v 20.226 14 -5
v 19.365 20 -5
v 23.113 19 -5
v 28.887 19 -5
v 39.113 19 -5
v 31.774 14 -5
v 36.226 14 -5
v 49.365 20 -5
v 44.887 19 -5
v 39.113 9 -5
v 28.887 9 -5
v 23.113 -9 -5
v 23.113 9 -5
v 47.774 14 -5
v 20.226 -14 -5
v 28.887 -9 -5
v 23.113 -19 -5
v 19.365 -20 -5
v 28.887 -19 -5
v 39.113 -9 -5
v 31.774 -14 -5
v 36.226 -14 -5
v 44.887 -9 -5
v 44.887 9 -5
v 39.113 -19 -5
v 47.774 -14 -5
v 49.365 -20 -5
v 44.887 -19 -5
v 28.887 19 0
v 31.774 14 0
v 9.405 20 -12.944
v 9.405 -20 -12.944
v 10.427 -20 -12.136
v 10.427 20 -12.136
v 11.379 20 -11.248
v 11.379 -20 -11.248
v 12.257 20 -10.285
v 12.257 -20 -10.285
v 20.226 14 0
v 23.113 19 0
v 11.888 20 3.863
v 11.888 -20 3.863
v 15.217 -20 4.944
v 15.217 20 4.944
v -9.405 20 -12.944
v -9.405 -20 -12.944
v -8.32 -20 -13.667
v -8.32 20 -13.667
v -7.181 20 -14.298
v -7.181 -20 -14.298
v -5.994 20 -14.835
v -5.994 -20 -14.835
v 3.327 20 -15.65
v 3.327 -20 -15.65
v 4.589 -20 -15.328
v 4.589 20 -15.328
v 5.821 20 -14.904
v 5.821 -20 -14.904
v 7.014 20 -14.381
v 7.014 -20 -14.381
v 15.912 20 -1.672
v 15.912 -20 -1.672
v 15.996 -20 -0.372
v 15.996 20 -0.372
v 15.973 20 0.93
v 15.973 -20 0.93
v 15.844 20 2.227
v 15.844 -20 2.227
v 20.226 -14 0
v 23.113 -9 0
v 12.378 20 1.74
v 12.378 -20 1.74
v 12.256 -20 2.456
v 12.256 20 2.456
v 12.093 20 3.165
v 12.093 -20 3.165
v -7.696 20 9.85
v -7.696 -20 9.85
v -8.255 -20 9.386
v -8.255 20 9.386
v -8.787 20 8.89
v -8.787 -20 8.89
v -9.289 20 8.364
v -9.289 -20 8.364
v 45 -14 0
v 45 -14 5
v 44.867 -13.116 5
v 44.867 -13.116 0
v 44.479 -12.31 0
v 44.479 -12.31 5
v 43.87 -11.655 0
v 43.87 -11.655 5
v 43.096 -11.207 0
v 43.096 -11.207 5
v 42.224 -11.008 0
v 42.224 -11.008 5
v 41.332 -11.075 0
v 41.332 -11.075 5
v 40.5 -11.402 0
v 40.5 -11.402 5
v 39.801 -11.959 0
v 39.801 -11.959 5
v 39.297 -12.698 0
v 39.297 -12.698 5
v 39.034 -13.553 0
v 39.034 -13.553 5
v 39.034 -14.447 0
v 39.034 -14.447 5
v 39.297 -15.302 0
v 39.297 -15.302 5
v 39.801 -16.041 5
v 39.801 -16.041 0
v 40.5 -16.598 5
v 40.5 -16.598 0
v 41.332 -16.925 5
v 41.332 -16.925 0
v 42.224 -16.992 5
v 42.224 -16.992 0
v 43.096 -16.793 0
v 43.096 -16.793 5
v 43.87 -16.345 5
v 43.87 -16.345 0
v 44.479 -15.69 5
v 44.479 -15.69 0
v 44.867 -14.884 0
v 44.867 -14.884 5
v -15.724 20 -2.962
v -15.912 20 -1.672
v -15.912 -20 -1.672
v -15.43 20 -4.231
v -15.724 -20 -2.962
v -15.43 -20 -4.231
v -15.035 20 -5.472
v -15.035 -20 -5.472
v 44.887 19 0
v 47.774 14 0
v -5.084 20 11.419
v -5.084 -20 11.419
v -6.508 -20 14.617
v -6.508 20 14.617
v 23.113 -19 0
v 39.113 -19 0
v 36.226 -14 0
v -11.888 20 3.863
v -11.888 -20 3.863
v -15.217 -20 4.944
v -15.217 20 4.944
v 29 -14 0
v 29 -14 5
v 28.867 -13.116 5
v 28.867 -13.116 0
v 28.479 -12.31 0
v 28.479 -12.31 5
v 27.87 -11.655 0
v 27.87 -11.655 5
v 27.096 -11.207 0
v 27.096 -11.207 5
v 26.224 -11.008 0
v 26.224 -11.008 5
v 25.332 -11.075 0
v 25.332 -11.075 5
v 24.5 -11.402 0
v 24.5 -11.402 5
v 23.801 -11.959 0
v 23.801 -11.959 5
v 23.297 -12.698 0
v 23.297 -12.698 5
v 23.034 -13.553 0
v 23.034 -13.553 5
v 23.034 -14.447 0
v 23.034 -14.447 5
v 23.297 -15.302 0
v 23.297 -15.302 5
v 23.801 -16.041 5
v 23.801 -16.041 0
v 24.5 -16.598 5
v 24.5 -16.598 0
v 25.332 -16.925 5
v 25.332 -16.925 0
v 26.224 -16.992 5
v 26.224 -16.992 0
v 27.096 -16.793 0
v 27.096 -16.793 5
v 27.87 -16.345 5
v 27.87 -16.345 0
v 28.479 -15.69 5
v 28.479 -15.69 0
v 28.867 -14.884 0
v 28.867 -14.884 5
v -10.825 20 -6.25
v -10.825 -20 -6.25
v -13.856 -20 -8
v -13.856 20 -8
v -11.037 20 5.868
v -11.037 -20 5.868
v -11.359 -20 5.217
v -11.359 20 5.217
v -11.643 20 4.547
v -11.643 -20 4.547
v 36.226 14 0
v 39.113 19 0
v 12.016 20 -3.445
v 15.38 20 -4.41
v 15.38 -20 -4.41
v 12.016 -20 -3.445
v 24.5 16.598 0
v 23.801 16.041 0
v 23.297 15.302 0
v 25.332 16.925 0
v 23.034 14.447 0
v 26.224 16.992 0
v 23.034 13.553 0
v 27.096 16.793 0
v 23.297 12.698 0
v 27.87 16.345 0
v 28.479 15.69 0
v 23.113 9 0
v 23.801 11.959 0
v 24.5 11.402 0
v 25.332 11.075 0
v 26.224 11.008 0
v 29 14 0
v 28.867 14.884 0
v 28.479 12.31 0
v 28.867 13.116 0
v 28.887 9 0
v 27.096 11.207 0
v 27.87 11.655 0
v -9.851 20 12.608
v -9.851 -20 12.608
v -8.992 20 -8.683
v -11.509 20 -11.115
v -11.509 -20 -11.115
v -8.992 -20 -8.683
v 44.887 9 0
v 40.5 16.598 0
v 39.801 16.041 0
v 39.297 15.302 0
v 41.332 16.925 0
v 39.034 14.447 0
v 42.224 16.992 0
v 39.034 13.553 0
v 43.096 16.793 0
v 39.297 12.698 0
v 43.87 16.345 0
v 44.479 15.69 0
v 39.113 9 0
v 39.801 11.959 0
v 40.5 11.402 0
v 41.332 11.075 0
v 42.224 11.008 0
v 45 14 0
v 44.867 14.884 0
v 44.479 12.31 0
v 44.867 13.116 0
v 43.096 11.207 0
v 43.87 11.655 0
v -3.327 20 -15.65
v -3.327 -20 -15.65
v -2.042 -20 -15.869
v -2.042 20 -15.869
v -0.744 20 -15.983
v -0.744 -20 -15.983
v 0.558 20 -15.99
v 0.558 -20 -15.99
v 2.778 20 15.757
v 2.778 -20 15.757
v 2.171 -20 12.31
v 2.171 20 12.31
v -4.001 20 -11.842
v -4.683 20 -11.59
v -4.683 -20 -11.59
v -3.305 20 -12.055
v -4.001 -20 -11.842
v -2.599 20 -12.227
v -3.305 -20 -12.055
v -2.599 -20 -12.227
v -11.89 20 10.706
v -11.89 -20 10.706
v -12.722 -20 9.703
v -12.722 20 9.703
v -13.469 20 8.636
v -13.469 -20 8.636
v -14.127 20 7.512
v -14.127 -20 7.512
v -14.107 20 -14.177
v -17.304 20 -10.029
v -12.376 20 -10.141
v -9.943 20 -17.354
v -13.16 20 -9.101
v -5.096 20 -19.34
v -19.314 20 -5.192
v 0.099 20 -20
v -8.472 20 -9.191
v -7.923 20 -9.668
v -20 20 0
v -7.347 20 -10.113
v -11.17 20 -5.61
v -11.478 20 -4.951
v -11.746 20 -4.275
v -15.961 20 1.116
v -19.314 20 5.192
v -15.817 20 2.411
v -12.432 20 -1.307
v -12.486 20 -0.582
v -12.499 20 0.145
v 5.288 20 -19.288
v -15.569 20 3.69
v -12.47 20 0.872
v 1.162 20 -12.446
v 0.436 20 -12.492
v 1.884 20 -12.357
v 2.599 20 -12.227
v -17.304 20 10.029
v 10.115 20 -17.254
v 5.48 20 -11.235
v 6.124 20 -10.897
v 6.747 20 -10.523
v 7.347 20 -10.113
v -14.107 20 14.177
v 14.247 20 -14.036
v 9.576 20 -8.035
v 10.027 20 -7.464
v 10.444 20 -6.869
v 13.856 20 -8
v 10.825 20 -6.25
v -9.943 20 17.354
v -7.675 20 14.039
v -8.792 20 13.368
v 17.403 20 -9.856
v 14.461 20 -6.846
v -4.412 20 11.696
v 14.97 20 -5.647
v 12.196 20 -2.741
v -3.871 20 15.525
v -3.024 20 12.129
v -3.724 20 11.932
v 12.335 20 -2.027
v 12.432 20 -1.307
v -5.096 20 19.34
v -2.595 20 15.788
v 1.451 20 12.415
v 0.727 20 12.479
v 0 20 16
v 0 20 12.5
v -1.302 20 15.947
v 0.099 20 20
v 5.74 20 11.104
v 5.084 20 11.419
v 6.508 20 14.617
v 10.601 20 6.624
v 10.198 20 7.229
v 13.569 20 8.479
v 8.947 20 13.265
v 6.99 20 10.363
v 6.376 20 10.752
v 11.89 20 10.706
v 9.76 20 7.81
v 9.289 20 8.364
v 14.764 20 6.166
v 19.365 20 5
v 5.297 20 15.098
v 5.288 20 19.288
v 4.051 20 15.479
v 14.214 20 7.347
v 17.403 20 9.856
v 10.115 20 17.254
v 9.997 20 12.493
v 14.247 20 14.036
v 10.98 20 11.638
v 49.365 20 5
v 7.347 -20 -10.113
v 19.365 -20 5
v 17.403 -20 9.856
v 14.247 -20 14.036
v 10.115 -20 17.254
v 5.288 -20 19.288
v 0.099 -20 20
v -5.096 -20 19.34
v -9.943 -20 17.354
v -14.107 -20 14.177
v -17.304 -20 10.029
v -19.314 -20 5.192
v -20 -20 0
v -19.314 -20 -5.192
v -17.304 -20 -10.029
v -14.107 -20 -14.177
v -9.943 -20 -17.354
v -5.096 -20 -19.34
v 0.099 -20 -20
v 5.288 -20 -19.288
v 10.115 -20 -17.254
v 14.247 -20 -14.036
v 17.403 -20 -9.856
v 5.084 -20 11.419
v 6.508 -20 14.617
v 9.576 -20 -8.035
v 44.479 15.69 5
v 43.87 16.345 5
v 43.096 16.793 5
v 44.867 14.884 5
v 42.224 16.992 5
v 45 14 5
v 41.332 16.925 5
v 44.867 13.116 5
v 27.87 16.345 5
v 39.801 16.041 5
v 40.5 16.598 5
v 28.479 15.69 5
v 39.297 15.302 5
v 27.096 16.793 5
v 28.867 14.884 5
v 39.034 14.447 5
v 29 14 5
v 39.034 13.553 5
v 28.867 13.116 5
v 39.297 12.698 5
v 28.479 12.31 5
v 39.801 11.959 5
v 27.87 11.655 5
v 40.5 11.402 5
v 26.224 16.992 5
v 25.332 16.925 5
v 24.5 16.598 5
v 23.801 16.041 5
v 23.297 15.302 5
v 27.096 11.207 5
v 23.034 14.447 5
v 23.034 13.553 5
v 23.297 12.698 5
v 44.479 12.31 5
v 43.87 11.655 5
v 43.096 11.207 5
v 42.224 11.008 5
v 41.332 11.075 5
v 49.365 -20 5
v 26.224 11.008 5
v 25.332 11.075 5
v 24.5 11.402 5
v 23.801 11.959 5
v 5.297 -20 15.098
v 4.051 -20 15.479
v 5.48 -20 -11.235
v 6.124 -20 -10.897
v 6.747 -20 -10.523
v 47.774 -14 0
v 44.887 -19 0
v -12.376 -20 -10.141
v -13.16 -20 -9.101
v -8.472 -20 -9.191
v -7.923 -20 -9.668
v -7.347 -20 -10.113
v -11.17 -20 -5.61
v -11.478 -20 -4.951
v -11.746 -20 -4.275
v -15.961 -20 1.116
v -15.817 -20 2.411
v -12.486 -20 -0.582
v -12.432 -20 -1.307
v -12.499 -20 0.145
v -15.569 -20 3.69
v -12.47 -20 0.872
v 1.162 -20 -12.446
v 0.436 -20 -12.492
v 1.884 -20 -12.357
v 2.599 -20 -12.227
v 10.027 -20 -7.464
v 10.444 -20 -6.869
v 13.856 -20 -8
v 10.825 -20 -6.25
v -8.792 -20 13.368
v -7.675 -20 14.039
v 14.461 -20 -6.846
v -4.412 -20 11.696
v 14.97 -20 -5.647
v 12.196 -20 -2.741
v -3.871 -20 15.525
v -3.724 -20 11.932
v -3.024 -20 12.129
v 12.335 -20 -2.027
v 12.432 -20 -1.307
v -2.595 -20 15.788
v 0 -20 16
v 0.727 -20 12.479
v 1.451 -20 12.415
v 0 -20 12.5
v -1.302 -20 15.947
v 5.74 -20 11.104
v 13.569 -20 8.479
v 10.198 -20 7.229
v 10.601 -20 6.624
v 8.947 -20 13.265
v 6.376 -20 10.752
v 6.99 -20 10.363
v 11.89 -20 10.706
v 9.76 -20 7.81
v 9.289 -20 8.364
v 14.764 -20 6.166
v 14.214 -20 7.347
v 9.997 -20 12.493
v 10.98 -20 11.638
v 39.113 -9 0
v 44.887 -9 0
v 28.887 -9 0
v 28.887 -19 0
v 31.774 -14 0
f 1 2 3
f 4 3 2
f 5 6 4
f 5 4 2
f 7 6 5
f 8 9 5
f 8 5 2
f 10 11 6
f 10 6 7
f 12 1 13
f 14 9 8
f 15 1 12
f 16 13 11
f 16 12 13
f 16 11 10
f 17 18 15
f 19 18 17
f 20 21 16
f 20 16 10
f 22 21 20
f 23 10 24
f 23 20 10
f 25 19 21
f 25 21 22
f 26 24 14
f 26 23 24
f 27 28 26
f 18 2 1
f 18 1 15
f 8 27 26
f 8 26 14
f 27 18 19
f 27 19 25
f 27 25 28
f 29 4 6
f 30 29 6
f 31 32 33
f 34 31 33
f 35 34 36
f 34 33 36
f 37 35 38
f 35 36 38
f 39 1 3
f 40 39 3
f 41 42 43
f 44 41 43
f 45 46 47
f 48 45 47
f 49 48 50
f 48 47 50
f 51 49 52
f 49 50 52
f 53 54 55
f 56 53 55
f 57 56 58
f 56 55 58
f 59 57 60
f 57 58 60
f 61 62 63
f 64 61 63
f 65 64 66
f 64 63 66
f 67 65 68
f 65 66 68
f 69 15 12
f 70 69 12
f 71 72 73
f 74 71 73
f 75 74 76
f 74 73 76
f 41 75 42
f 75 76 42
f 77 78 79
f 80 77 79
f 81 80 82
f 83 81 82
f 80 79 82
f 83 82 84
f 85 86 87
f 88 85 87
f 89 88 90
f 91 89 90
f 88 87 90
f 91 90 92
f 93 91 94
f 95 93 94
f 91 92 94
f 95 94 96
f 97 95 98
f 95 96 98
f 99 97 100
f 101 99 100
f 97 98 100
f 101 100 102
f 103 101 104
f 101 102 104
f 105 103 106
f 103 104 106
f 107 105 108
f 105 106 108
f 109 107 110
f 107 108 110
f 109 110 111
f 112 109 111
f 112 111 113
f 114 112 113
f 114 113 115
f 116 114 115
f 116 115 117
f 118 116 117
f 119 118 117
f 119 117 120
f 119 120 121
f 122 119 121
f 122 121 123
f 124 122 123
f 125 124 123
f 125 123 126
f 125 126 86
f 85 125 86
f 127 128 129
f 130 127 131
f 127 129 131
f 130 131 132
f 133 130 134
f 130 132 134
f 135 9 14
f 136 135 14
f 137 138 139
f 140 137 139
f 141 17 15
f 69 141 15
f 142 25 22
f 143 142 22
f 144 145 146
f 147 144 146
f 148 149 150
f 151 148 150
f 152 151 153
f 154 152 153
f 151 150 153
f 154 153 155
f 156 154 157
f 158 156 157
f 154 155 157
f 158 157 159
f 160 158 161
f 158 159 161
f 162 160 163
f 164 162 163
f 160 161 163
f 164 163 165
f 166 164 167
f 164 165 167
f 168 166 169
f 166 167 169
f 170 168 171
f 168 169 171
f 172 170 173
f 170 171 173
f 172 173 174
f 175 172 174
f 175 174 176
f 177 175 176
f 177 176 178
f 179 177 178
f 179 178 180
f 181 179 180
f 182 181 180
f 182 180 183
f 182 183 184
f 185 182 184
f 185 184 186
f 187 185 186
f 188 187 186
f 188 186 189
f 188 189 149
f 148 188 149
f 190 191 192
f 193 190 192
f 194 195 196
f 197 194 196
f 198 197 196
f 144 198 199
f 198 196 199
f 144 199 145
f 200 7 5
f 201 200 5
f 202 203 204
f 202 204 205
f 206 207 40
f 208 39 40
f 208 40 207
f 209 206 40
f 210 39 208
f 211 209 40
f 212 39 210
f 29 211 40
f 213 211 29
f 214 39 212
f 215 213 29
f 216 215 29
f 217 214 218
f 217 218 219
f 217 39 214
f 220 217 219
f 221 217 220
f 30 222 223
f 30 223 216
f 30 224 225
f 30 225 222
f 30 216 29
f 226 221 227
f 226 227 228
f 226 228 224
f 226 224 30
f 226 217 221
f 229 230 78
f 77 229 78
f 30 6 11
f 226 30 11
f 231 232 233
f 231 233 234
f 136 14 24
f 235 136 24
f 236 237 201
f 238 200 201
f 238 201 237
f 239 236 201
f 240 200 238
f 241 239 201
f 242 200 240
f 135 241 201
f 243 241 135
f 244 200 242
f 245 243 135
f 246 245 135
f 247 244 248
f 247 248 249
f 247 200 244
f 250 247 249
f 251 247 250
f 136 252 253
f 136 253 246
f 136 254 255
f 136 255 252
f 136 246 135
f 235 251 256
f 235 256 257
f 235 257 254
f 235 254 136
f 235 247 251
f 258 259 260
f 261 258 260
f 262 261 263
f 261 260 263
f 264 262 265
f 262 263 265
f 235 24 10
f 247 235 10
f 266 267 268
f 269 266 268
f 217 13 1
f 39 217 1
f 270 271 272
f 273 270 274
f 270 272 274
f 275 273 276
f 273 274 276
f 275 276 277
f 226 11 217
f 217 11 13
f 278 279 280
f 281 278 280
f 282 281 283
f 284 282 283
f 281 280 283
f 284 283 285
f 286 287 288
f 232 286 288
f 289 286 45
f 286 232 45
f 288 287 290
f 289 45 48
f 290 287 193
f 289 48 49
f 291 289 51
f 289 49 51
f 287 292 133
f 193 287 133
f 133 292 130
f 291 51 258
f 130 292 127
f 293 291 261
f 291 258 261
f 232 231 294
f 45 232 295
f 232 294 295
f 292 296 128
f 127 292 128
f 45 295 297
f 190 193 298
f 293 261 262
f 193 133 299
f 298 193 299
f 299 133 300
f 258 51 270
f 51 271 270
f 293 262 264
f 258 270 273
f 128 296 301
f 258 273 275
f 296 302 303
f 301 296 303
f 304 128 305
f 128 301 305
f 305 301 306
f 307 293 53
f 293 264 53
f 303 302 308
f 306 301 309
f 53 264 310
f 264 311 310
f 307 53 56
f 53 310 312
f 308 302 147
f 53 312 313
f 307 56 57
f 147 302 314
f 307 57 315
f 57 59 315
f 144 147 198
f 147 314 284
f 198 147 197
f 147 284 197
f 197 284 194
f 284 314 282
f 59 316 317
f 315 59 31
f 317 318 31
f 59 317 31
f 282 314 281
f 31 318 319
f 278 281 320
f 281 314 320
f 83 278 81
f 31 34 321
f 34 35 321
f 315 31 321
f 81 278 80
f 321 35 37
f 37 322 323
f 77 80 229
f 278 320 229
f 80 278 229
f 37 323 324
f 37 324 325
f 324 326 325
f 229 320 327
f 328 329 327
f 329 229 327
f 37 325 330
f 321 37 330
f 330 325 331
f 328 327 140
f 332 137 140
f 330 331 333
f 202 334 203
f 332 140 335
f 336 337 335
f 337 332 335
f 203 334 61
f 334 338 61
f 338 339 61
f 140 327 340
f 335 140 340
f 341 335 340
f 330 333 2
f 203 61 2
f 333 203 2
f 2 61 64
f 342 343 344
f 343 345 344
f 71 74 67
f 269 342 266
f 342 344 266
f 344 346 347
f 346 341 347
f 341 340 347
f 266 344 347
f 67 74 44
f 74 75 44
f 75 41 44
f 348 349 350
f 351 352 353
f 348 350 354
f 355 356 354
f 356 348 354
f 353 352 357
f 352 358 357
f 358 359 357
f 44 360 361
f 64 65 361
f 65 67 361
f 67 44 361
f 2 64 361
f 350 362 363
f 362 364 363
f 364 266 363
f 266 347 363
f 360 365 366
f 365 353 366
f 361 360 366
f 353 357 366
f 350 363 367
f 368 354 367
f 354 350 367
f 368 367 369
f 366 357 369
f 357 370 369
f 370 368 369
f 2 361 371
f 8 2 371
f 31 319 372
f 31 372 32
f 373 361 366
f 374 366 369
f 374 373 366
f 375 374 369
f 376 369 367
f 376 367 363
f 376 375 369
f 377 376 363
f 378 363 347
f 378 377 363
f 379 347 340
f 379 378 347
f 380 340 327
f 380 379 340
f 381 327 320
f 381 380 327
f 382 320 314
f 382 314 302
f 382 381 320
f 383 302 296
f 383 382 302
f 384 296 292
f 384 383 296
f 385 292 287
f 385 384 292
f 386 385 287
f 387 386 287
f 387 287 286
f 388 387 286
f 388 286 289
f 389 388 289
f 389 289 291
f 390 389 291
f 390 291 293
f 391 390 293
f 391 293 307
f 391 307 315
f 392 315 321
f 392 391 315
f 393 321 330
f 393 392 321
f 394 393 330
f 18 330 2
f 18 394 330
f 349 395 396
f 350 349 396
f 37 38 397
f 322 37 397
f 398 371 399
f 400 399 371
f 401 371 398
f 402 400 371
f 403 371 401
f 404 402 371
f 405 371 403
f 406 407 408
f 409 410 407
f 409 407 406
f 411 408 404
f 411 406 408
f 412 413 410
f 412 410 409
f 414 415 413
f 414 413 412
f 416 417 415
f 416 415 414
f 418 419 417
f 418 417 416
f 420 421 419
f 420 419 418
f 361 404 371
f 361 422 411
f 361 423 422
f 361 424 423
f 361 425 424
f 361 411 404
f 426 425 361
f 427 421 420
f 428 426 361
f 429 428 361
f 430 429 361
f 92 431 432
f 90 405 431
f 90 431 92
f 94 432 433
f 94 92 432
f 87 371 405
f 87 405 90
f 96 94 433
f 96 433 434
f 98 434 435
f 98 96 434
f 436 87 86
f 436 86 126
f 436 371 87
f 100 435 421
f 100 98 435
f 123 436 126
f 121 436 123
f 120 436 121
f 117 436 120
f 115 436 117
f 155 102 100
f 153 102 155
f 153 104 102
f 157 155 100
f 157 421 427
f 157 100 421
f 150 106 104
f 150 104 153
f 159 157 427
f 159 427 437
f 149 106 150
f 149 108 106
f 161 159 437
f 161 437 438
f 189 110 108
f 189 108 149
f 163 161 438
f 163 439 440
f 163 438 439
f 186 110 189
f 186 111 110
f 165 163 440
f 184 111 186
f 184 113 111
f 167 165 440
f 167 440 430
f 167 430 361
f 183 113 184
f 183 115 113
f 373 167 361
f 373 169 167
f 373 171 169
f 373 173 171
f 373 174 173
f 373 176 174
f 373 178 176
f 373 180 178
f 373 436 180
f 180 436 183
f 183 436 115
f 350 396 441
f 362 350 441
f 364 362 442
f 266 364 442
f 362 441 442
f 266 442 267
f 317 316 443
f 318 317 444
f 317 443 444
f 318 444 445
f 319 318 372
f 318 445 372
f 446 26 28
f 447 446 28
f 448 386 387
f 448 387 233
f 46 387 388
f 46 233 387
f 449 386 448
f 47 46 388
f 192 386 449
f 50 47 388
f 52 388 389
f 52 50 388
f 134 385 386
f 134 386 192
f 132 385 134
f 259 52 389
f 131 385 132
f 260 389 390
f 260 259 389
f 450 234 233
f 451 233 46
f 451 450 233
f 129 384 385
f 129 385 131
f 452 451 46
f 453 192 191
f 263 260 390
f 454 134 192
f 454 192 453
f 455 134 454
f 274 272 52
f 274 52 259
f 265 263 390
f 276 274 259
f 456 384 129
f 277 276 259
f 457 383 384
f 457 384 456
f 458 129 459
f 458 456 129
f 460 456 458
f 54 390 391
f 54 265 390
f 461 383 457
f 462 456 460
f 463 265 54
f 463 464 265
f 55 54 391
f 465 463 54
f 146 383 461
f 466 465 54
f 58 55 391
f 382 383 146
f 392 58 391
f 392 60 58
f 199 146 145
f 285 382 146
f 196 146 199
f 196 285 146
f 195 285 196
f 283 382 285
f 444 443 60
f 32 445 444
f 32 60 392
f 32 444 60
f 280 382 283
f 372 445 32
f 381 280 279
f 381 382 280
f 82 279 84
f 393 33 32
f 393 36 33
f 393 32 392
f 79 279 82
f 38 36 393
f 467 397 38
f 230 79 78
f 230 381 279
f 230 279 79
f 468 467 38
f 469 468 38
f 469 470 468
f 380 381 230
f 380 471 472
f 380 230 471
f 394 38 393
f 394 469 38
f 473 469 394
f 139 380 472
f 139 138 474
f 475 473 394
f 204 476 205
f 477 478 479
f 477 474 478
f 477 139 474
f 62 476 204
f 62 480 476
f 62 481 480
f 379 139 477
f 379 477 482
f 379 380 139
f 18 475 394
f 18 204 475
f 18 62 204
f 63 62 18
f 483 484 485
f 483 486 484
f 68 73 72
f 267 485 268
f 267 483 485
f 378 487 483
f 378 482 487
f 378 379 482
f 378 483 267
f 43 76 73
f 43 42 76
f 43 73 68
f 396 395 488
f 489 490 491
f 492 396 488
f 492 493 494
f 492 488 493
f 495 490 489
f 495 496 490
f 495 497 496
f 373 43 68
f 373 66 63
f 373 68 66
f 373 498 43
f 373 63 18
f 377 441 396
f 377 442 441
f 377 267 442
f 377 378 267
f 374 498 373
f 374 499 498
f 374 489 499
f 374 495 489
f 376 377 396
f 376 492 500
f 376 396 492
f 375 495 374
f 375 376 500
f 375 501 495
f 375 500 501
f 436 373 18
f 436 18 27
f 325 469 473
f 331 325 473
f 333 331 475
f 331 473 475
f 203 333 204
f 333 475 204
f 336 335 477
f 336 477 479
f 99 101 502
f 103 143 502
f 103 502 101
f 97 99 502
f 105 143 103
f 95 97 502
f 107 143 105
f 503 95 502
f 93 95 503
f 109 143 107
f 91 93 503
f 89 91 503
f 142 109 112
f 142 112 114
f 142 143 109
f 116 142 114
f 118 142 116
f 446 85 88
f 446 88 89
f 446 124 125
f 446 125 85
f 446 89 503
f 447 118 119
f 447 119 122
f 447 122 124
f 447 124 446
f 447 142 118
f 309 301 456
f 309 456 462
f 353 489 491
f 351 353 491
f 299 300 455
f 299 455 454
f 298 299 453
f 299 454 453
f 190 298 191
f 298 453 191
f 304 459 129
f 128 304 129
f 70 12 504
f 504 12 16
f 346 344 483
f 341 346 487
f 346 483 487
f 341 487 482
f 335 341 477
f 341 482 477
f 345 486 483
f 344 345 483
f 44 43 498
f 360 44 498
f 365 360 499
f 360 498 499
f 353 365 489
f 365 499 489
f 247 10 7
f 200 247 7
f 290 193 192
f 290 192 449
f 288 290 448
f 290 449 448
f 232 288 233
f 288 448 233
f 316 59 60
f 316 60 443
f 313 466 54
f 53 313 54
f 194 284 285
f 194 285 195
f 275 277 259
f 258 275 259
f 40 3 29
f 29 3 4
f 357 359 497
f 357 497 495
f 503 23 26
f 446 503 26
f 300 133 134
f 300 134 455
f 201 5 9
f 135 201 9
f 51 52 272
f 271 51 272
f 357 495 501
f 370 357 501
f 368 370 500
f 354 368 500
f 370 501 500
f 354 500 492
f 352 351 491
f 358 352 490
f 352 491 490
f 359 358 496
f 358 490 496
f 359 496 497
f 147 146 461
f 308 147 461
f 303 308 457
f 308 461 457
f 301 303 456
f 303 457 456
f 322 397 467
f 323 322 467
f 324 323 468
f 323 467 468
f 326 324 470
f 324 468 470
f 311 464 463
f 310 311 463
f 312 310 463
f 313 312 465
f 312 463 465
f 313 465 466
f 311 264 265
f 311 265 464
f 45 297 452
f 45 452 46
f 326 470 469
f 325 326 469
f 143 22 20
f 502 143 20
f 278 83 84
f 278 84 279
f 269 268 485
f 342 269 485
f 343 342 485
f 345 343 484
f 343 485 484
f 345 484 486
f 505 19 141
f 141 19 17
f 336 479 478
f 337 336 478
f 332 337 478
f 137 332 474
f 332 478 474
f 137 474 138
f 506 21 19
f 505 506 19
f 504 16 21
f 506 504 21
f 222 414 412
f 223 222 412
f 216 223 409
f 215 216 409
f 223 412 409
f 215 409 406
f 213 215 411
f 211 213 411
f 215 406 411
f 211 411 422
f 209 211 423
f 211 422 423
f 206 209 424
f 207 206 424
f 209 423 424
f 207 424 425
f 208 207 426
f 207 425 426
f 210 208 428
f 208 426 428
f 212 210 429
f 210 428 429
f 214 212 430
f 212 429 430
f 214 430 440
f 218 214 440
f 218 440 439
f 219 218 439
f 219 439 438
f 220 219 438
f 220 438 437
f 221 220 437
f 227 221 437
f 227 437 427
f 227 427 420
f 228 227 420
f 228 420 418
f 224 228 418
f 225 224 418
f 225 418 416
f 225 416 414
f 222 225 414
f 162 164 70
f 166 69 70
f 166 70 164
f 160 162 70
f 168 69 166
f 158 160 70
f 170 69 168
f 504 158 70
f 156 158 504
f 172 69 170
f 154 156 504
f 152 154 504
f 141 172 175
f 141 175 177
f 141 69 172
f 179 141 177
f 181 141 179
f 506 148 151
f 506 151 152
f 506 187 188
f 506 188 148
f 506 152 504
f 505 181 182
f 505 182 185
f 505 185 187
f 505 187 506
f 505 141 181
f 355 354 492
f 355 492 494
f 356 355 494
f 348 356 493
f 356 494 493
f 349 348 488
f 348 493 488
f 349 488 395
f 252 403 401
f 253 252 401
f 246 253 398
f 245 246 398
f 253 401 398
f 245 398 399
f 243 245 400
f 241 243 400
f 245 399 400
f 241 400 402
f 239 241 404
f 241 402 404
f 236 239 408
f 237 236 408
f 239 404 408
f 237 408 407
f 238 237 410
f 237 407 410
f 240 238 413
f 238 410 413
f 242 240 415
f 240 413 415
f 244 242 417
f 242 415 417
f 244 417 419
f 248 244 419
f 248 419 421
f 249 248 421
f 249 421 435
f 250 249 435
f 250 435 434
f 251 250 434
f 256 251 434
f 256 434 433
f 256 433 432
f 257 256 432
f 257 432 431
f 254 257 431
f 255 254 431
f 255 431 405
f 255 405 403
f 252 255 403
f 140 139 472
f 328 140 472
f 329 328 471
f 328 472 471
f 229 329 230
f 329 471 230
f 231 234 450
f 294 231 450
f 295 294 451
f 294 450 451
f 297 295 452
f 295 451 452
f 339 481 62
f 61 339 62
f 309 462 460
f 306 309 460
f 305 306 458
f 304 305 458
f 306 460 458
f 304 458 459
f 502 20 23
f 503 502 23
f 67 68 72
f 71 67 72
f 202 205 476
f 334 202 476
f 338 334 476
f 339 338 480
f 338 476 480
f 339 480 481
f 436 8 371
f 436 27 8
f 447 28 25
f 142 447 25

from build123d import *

# Parameters (mm, degrees)
F0_R          = 12.5
F1_DEPTH      = 20
F1_DEPTH_BACK = 20
F3_DEPTH      = 40.001
F4_R          = 3
F5_DEPTH      = 25.001
F7_DEPTH      = 5


with BuildPart() as f1:
    # F0 (on Front) → F1 (new body, two sides)
    with BuildSketch(Plane.XZ) as f1_sk:
        with BuildLine():
            Line((49.364916731, 5), (19.364916731, 5))
            ThreePointArc((19.364916731, 5), (-20, 0), (19.364916731, -5))
            Line((19.364916731, -5), (49.364916731, -5))
            Line((49.364916731, -5), (49.364916731, 5))
        make_face()
        Circle(F0_R, mode=Mode.SUBTRACT)
    extrude(amount=F1_DEPTH)
    extrude(f1_sk.sketch, amount=-F1_DEPTH_BACK)

    # F2 (on face) → F3 (cut, through all)
    with BuildSketch(Plane.XZ.offset(20)):
        with BuildLine():
            Line((5.0842080384, 11.4193182205), (6.5077862892, 14.6167273223))
            ThreePointArc((6.5077862892, 14.6167273223), (4.6779472756, 15.3008760954), (2.7783708427, 15.7569240482))
            Line((2.7783708427, 15.7569240482), (2.1706022208, 12.3100969127))
            ThreePointArc((2.1706022208, 12.3100969127), (3.654646309, 11.9538094495), (5.0842080384, 11.4193182205))
        make_face()
        with BuildLine():
            Line((-3.8707503296, 15.5247316204), (-3.024023695, 12.1286965784))
            ThreePointArc((-3.024023695, 12.1286965784), (-1.5233667926, 12.4068268955), (0, 12.5))
            Line((0, 12.5), (0, 16))
            ThreePointArc((0, 16), (-1.9499094945, 15.8807384263), (-3.8707503296, 15.5247316204))
        make_face()
        with BuildLine():
            Line((-9.8505836052, 12.6081720577), (-7.6957684416, 9.8501344201))
            ThreePointArc((-7.6957684416, 9.8501344201), (-6.4379759364, 10.7145912588), (-5.0842080384, 11.4193182205))
            Line((-5.0842080384, 11.4193182205), (-6.5077862892, 14.6167273223))
            ThreePointArc((-6.5077862892, 14.6167273223), (-8.2406091986, 13.7146768112), (-9.8505836052, 12.6081720577))
        make_face()
        with BuildLine():
            Line((-14.1271614857, 7.5115450046), (-11.0368449107, 5.8683945348))
            ThreePointArc((-11.0368449107, 5.8683945348), (-10.2394005536, 7.1697054544), (-9.2893103185, 8.3641325795))
            Line((-9.2893103185, 8.3641325795), (-11.8903172076, 10.7060897017))
            ThreePointArc((-11.8903172076, 10.7060897017), (-13.1064327086, 9.1772229816), (-14.1271614857, 7.5115450046))
        make_face()
        with BuildLine():
            Line((-15.9610248042, 1.1161035799), (-12.4695506282, 0.8719559218))
            ThreePointArc((-12.4695506282, 0.8719559218), (-12.2703397931, 2.3851124422), (-11.8882064537, 3.8627124297))
            Line((-11.8882064537, 3.8627124297), (-15.2169042607, 4.94427191))
            ThreePointArc((-15.2169042607, 4.94427191), (-15.7060349352, 3.052943926), (-15.9610248042, 1.1161035799))
        make_face()
        with BuildLine():
            Line((-15.0350819326, -5.4723222932), (-11.7461577598, -4.2752517916))
            ThreePointArc((-11.7461577598, -4.2752517916), (-12.1796258098, -2.8118881793), (-12.4315236921, -1.3066057908))
            Line((-12.4315236921, -1.3066057908), (-15.9123503259, -1.6724554123))
            ThreePointArc((-15.9123503259, -1.6724554123), (-15.5899210366, -3.5992168695), (-15.0350819326, -5.4723222932))
        make_face()
        with BuildLine():
            Line((-11.5094368054, -11.1145339273), (-8.9917475042, -8.6832296307))
            ThreePointArc((-8.9917475042, -8.6832296307), (-9.9829438756, -7.5226877894), (-10.8253175473, -6.25))
            Line((-10.8253175473, -6.25), (-13.8564064606, -8))
            ThreePointArc((-13.8564064606, -8), (-12.7781681608, -9.6290403704), (-11.5094368054, -11.1145339273))
        make_face()
        with BuildLine():
            Line((-5.9937054947, -14.8349416731), (-4.6825824177, -11.5897981821))
            ThreePointArc((-4.6825824177, -11.5897981821), (-6.0601202531, -10.9327463392), (-7.3473156537, -10.1127124297))
            Line((-7.3473156537, -10.1127124297), (-9.4045640367, -12.94427191))
            ThreePointArc((-9.4045640367, -12.94427191), (-7.7569539239, -13.9939153142), (-5.9937054947, -14.8349416731))
        make_face()
        with BuildLine():
            Line((0.5583919472, -15.9902532323), (0.4362437088, -12.4923853377))
            ThreePointArc((0.4362437088, -12.4923853377), (-1.0894467843, -12.4524337261), (-2.5988961352, -12.2268450092))
            Line((-2.5988961352, -12.2268450092), (-3.3265870531, -15.6503616117))
            ThreePointArc((-3.3265870531, -15.6503616117), (-1.394491884, -15.9391151695), (0.5583919472, -15.9902532323))
        make_face()
        with BuildLine():
            Line((7.0139383486, -14.3807047408), (5.4796393349, -11.2349255787))
            ThreePointArc((5.4796393349, -11.2349255787), (4.0696019307, -11.818982195), (2.5988961352, -12.2268450092))
            Line((2.5988961352, -12.2268450092), (3.3265870531, -15.6503616117))
            ThreePointArc((3.3265870531, -15.6503616117), (5.2090904713, -15.1282972096), (7.0139383486, -14.3807047408))
        make_face()
        with BuildLine():
            Line((12.2567110899, -10.284601755), (9.575555539, -8.0348451211))
            ThreePointArc((9.575555539, -8.0348451211), (8.5249795008, -9.1419212702), (7.3473156537, -10.1127124297))
            Line((7.3473156537, -10.1127124297), (9.4045640367, -12.94427191))
            ThreePointArc((9.4045640367, -12.94427191), (10.911973761, -11.7016592259), (12.2567110899, -10.284601755))
        make_face()
        with BuildLine():
            Line((15.380187135, -4.4101976931), (12.0157711992, -3.4454669477))
            ThreePointArc((12.0157711992, -3.4454669477), (11.5063106682, -4.8841391061), (10.8253175473, -6.25))
            Line((10.8253175473, -6.25), (13.8564064606, -8))
            ThreePointArc((13.8564064606, -8), (14.7280776552, -6.2516980558), (15.380187135, -4.4101976931))
        make_face()
        with BuildLine():
            Line((15.8442890999, 2.2267696154), (12.3783508593, 1.739663762))
            ThreePointArc((12.3783508593, 1.739663762), (12.4980961895, 0.2181550805), (12.4315236921, -1.3066057908))
            Line((12.4315236921, -1.3066057908), (15.9123503259, -1.6724554123))
            ThreePointArc((15.9123503259, -1.6724554123), (15.9975631225, 0.279238503), (15.8442890999, 2.2267696154))
        make_face()
        with BuildLine():
            Line((13.5687695385, 8.4787082277), (10.600601202, 6.6239908029))
            ThreePointArc((10.600601202, 6.6239908029), (11.328847338, 5.2827282718), (11.8882064537, 3.8627124297))
            Line((11.8882064537, 3.8627124297), (15.2169042607, 4.94427191))
            ThreePointArc((15.2169042607, 4.94427191), (14.5009245926, 6.7618921879), (13.5687695385, 8.4787082277))
        make_face()
        with BuildLine():
            Line((8.9470864555, 13.2646011609), (6.9899112934, 10.3629696569))
            ThreePointArc((6.9899112934, 10.3629696569), (8.2007378624, 9.4338697528), (9.2893103185, 8.3641325795))
            Line((9.2893103185, 8.3641325795), (11.8903172076, 10.7060897017))
            ThreePointArc((11.8903172076, 10.7060897017), (10.4969444638, 12.0753532836), (8.9470864555, 13.2646011609))
        make_face()
    extrude(amount=-F3_DEPTH, mode=Mode.SUBTRACT)

    # F4 (on face) → F5 (cut, through all)
    with BuildSketch(Plane.XY.offset(5)):
        with Locations((26, 14)):
            Circle(F4_R)
        with Locations((42, 14)):
            Circle(F4_R)
        with Locations((26, -14)):
            Circle(F4_R)
        with Locations((42, -14)):
            Circle(F4_R)
    extrude(amount=-F5_DEPTH, mode=Mode.SUBTRACT)

    # F6 (on face) → F7 (cut)
    with BuildSketch(Plane(origin=(0, 0, -5), x_dir=(1, 0, 0), z_dir=(0, 0, -1))):
        Polygon((31.7735026919, 14), (28.8867513459, 19), (23.1132486541, 19), (20.2264973081, 14), (23.1132486541, 9), (28.8867513459, 9), align=None)
        Polygon((39.1132486541, 9), (44.8867513459, 9), (47.7735026919, 14), (44.8867513459, 19), (39.1132486541, 19), (36.2264973081, 14), align=None)
        Polygon((39.1132486541, -9), (36.2264973081, -14), (39.1132486541, -19), (44.8867513459, -19), (47.7735026919, -14), (44.8867513459, -9), align=None)
        Polygon((20.2264973081, -14), (23.1132486541, -19), (28.8867513459, -19), (31.7735026919, -14), (28.8867513459, -9), (23.1132486541, -9), align=None)
    extrude(amount=-F7_DEPTH, mode=Mode.SUBTRACT)


solid = f1.part
